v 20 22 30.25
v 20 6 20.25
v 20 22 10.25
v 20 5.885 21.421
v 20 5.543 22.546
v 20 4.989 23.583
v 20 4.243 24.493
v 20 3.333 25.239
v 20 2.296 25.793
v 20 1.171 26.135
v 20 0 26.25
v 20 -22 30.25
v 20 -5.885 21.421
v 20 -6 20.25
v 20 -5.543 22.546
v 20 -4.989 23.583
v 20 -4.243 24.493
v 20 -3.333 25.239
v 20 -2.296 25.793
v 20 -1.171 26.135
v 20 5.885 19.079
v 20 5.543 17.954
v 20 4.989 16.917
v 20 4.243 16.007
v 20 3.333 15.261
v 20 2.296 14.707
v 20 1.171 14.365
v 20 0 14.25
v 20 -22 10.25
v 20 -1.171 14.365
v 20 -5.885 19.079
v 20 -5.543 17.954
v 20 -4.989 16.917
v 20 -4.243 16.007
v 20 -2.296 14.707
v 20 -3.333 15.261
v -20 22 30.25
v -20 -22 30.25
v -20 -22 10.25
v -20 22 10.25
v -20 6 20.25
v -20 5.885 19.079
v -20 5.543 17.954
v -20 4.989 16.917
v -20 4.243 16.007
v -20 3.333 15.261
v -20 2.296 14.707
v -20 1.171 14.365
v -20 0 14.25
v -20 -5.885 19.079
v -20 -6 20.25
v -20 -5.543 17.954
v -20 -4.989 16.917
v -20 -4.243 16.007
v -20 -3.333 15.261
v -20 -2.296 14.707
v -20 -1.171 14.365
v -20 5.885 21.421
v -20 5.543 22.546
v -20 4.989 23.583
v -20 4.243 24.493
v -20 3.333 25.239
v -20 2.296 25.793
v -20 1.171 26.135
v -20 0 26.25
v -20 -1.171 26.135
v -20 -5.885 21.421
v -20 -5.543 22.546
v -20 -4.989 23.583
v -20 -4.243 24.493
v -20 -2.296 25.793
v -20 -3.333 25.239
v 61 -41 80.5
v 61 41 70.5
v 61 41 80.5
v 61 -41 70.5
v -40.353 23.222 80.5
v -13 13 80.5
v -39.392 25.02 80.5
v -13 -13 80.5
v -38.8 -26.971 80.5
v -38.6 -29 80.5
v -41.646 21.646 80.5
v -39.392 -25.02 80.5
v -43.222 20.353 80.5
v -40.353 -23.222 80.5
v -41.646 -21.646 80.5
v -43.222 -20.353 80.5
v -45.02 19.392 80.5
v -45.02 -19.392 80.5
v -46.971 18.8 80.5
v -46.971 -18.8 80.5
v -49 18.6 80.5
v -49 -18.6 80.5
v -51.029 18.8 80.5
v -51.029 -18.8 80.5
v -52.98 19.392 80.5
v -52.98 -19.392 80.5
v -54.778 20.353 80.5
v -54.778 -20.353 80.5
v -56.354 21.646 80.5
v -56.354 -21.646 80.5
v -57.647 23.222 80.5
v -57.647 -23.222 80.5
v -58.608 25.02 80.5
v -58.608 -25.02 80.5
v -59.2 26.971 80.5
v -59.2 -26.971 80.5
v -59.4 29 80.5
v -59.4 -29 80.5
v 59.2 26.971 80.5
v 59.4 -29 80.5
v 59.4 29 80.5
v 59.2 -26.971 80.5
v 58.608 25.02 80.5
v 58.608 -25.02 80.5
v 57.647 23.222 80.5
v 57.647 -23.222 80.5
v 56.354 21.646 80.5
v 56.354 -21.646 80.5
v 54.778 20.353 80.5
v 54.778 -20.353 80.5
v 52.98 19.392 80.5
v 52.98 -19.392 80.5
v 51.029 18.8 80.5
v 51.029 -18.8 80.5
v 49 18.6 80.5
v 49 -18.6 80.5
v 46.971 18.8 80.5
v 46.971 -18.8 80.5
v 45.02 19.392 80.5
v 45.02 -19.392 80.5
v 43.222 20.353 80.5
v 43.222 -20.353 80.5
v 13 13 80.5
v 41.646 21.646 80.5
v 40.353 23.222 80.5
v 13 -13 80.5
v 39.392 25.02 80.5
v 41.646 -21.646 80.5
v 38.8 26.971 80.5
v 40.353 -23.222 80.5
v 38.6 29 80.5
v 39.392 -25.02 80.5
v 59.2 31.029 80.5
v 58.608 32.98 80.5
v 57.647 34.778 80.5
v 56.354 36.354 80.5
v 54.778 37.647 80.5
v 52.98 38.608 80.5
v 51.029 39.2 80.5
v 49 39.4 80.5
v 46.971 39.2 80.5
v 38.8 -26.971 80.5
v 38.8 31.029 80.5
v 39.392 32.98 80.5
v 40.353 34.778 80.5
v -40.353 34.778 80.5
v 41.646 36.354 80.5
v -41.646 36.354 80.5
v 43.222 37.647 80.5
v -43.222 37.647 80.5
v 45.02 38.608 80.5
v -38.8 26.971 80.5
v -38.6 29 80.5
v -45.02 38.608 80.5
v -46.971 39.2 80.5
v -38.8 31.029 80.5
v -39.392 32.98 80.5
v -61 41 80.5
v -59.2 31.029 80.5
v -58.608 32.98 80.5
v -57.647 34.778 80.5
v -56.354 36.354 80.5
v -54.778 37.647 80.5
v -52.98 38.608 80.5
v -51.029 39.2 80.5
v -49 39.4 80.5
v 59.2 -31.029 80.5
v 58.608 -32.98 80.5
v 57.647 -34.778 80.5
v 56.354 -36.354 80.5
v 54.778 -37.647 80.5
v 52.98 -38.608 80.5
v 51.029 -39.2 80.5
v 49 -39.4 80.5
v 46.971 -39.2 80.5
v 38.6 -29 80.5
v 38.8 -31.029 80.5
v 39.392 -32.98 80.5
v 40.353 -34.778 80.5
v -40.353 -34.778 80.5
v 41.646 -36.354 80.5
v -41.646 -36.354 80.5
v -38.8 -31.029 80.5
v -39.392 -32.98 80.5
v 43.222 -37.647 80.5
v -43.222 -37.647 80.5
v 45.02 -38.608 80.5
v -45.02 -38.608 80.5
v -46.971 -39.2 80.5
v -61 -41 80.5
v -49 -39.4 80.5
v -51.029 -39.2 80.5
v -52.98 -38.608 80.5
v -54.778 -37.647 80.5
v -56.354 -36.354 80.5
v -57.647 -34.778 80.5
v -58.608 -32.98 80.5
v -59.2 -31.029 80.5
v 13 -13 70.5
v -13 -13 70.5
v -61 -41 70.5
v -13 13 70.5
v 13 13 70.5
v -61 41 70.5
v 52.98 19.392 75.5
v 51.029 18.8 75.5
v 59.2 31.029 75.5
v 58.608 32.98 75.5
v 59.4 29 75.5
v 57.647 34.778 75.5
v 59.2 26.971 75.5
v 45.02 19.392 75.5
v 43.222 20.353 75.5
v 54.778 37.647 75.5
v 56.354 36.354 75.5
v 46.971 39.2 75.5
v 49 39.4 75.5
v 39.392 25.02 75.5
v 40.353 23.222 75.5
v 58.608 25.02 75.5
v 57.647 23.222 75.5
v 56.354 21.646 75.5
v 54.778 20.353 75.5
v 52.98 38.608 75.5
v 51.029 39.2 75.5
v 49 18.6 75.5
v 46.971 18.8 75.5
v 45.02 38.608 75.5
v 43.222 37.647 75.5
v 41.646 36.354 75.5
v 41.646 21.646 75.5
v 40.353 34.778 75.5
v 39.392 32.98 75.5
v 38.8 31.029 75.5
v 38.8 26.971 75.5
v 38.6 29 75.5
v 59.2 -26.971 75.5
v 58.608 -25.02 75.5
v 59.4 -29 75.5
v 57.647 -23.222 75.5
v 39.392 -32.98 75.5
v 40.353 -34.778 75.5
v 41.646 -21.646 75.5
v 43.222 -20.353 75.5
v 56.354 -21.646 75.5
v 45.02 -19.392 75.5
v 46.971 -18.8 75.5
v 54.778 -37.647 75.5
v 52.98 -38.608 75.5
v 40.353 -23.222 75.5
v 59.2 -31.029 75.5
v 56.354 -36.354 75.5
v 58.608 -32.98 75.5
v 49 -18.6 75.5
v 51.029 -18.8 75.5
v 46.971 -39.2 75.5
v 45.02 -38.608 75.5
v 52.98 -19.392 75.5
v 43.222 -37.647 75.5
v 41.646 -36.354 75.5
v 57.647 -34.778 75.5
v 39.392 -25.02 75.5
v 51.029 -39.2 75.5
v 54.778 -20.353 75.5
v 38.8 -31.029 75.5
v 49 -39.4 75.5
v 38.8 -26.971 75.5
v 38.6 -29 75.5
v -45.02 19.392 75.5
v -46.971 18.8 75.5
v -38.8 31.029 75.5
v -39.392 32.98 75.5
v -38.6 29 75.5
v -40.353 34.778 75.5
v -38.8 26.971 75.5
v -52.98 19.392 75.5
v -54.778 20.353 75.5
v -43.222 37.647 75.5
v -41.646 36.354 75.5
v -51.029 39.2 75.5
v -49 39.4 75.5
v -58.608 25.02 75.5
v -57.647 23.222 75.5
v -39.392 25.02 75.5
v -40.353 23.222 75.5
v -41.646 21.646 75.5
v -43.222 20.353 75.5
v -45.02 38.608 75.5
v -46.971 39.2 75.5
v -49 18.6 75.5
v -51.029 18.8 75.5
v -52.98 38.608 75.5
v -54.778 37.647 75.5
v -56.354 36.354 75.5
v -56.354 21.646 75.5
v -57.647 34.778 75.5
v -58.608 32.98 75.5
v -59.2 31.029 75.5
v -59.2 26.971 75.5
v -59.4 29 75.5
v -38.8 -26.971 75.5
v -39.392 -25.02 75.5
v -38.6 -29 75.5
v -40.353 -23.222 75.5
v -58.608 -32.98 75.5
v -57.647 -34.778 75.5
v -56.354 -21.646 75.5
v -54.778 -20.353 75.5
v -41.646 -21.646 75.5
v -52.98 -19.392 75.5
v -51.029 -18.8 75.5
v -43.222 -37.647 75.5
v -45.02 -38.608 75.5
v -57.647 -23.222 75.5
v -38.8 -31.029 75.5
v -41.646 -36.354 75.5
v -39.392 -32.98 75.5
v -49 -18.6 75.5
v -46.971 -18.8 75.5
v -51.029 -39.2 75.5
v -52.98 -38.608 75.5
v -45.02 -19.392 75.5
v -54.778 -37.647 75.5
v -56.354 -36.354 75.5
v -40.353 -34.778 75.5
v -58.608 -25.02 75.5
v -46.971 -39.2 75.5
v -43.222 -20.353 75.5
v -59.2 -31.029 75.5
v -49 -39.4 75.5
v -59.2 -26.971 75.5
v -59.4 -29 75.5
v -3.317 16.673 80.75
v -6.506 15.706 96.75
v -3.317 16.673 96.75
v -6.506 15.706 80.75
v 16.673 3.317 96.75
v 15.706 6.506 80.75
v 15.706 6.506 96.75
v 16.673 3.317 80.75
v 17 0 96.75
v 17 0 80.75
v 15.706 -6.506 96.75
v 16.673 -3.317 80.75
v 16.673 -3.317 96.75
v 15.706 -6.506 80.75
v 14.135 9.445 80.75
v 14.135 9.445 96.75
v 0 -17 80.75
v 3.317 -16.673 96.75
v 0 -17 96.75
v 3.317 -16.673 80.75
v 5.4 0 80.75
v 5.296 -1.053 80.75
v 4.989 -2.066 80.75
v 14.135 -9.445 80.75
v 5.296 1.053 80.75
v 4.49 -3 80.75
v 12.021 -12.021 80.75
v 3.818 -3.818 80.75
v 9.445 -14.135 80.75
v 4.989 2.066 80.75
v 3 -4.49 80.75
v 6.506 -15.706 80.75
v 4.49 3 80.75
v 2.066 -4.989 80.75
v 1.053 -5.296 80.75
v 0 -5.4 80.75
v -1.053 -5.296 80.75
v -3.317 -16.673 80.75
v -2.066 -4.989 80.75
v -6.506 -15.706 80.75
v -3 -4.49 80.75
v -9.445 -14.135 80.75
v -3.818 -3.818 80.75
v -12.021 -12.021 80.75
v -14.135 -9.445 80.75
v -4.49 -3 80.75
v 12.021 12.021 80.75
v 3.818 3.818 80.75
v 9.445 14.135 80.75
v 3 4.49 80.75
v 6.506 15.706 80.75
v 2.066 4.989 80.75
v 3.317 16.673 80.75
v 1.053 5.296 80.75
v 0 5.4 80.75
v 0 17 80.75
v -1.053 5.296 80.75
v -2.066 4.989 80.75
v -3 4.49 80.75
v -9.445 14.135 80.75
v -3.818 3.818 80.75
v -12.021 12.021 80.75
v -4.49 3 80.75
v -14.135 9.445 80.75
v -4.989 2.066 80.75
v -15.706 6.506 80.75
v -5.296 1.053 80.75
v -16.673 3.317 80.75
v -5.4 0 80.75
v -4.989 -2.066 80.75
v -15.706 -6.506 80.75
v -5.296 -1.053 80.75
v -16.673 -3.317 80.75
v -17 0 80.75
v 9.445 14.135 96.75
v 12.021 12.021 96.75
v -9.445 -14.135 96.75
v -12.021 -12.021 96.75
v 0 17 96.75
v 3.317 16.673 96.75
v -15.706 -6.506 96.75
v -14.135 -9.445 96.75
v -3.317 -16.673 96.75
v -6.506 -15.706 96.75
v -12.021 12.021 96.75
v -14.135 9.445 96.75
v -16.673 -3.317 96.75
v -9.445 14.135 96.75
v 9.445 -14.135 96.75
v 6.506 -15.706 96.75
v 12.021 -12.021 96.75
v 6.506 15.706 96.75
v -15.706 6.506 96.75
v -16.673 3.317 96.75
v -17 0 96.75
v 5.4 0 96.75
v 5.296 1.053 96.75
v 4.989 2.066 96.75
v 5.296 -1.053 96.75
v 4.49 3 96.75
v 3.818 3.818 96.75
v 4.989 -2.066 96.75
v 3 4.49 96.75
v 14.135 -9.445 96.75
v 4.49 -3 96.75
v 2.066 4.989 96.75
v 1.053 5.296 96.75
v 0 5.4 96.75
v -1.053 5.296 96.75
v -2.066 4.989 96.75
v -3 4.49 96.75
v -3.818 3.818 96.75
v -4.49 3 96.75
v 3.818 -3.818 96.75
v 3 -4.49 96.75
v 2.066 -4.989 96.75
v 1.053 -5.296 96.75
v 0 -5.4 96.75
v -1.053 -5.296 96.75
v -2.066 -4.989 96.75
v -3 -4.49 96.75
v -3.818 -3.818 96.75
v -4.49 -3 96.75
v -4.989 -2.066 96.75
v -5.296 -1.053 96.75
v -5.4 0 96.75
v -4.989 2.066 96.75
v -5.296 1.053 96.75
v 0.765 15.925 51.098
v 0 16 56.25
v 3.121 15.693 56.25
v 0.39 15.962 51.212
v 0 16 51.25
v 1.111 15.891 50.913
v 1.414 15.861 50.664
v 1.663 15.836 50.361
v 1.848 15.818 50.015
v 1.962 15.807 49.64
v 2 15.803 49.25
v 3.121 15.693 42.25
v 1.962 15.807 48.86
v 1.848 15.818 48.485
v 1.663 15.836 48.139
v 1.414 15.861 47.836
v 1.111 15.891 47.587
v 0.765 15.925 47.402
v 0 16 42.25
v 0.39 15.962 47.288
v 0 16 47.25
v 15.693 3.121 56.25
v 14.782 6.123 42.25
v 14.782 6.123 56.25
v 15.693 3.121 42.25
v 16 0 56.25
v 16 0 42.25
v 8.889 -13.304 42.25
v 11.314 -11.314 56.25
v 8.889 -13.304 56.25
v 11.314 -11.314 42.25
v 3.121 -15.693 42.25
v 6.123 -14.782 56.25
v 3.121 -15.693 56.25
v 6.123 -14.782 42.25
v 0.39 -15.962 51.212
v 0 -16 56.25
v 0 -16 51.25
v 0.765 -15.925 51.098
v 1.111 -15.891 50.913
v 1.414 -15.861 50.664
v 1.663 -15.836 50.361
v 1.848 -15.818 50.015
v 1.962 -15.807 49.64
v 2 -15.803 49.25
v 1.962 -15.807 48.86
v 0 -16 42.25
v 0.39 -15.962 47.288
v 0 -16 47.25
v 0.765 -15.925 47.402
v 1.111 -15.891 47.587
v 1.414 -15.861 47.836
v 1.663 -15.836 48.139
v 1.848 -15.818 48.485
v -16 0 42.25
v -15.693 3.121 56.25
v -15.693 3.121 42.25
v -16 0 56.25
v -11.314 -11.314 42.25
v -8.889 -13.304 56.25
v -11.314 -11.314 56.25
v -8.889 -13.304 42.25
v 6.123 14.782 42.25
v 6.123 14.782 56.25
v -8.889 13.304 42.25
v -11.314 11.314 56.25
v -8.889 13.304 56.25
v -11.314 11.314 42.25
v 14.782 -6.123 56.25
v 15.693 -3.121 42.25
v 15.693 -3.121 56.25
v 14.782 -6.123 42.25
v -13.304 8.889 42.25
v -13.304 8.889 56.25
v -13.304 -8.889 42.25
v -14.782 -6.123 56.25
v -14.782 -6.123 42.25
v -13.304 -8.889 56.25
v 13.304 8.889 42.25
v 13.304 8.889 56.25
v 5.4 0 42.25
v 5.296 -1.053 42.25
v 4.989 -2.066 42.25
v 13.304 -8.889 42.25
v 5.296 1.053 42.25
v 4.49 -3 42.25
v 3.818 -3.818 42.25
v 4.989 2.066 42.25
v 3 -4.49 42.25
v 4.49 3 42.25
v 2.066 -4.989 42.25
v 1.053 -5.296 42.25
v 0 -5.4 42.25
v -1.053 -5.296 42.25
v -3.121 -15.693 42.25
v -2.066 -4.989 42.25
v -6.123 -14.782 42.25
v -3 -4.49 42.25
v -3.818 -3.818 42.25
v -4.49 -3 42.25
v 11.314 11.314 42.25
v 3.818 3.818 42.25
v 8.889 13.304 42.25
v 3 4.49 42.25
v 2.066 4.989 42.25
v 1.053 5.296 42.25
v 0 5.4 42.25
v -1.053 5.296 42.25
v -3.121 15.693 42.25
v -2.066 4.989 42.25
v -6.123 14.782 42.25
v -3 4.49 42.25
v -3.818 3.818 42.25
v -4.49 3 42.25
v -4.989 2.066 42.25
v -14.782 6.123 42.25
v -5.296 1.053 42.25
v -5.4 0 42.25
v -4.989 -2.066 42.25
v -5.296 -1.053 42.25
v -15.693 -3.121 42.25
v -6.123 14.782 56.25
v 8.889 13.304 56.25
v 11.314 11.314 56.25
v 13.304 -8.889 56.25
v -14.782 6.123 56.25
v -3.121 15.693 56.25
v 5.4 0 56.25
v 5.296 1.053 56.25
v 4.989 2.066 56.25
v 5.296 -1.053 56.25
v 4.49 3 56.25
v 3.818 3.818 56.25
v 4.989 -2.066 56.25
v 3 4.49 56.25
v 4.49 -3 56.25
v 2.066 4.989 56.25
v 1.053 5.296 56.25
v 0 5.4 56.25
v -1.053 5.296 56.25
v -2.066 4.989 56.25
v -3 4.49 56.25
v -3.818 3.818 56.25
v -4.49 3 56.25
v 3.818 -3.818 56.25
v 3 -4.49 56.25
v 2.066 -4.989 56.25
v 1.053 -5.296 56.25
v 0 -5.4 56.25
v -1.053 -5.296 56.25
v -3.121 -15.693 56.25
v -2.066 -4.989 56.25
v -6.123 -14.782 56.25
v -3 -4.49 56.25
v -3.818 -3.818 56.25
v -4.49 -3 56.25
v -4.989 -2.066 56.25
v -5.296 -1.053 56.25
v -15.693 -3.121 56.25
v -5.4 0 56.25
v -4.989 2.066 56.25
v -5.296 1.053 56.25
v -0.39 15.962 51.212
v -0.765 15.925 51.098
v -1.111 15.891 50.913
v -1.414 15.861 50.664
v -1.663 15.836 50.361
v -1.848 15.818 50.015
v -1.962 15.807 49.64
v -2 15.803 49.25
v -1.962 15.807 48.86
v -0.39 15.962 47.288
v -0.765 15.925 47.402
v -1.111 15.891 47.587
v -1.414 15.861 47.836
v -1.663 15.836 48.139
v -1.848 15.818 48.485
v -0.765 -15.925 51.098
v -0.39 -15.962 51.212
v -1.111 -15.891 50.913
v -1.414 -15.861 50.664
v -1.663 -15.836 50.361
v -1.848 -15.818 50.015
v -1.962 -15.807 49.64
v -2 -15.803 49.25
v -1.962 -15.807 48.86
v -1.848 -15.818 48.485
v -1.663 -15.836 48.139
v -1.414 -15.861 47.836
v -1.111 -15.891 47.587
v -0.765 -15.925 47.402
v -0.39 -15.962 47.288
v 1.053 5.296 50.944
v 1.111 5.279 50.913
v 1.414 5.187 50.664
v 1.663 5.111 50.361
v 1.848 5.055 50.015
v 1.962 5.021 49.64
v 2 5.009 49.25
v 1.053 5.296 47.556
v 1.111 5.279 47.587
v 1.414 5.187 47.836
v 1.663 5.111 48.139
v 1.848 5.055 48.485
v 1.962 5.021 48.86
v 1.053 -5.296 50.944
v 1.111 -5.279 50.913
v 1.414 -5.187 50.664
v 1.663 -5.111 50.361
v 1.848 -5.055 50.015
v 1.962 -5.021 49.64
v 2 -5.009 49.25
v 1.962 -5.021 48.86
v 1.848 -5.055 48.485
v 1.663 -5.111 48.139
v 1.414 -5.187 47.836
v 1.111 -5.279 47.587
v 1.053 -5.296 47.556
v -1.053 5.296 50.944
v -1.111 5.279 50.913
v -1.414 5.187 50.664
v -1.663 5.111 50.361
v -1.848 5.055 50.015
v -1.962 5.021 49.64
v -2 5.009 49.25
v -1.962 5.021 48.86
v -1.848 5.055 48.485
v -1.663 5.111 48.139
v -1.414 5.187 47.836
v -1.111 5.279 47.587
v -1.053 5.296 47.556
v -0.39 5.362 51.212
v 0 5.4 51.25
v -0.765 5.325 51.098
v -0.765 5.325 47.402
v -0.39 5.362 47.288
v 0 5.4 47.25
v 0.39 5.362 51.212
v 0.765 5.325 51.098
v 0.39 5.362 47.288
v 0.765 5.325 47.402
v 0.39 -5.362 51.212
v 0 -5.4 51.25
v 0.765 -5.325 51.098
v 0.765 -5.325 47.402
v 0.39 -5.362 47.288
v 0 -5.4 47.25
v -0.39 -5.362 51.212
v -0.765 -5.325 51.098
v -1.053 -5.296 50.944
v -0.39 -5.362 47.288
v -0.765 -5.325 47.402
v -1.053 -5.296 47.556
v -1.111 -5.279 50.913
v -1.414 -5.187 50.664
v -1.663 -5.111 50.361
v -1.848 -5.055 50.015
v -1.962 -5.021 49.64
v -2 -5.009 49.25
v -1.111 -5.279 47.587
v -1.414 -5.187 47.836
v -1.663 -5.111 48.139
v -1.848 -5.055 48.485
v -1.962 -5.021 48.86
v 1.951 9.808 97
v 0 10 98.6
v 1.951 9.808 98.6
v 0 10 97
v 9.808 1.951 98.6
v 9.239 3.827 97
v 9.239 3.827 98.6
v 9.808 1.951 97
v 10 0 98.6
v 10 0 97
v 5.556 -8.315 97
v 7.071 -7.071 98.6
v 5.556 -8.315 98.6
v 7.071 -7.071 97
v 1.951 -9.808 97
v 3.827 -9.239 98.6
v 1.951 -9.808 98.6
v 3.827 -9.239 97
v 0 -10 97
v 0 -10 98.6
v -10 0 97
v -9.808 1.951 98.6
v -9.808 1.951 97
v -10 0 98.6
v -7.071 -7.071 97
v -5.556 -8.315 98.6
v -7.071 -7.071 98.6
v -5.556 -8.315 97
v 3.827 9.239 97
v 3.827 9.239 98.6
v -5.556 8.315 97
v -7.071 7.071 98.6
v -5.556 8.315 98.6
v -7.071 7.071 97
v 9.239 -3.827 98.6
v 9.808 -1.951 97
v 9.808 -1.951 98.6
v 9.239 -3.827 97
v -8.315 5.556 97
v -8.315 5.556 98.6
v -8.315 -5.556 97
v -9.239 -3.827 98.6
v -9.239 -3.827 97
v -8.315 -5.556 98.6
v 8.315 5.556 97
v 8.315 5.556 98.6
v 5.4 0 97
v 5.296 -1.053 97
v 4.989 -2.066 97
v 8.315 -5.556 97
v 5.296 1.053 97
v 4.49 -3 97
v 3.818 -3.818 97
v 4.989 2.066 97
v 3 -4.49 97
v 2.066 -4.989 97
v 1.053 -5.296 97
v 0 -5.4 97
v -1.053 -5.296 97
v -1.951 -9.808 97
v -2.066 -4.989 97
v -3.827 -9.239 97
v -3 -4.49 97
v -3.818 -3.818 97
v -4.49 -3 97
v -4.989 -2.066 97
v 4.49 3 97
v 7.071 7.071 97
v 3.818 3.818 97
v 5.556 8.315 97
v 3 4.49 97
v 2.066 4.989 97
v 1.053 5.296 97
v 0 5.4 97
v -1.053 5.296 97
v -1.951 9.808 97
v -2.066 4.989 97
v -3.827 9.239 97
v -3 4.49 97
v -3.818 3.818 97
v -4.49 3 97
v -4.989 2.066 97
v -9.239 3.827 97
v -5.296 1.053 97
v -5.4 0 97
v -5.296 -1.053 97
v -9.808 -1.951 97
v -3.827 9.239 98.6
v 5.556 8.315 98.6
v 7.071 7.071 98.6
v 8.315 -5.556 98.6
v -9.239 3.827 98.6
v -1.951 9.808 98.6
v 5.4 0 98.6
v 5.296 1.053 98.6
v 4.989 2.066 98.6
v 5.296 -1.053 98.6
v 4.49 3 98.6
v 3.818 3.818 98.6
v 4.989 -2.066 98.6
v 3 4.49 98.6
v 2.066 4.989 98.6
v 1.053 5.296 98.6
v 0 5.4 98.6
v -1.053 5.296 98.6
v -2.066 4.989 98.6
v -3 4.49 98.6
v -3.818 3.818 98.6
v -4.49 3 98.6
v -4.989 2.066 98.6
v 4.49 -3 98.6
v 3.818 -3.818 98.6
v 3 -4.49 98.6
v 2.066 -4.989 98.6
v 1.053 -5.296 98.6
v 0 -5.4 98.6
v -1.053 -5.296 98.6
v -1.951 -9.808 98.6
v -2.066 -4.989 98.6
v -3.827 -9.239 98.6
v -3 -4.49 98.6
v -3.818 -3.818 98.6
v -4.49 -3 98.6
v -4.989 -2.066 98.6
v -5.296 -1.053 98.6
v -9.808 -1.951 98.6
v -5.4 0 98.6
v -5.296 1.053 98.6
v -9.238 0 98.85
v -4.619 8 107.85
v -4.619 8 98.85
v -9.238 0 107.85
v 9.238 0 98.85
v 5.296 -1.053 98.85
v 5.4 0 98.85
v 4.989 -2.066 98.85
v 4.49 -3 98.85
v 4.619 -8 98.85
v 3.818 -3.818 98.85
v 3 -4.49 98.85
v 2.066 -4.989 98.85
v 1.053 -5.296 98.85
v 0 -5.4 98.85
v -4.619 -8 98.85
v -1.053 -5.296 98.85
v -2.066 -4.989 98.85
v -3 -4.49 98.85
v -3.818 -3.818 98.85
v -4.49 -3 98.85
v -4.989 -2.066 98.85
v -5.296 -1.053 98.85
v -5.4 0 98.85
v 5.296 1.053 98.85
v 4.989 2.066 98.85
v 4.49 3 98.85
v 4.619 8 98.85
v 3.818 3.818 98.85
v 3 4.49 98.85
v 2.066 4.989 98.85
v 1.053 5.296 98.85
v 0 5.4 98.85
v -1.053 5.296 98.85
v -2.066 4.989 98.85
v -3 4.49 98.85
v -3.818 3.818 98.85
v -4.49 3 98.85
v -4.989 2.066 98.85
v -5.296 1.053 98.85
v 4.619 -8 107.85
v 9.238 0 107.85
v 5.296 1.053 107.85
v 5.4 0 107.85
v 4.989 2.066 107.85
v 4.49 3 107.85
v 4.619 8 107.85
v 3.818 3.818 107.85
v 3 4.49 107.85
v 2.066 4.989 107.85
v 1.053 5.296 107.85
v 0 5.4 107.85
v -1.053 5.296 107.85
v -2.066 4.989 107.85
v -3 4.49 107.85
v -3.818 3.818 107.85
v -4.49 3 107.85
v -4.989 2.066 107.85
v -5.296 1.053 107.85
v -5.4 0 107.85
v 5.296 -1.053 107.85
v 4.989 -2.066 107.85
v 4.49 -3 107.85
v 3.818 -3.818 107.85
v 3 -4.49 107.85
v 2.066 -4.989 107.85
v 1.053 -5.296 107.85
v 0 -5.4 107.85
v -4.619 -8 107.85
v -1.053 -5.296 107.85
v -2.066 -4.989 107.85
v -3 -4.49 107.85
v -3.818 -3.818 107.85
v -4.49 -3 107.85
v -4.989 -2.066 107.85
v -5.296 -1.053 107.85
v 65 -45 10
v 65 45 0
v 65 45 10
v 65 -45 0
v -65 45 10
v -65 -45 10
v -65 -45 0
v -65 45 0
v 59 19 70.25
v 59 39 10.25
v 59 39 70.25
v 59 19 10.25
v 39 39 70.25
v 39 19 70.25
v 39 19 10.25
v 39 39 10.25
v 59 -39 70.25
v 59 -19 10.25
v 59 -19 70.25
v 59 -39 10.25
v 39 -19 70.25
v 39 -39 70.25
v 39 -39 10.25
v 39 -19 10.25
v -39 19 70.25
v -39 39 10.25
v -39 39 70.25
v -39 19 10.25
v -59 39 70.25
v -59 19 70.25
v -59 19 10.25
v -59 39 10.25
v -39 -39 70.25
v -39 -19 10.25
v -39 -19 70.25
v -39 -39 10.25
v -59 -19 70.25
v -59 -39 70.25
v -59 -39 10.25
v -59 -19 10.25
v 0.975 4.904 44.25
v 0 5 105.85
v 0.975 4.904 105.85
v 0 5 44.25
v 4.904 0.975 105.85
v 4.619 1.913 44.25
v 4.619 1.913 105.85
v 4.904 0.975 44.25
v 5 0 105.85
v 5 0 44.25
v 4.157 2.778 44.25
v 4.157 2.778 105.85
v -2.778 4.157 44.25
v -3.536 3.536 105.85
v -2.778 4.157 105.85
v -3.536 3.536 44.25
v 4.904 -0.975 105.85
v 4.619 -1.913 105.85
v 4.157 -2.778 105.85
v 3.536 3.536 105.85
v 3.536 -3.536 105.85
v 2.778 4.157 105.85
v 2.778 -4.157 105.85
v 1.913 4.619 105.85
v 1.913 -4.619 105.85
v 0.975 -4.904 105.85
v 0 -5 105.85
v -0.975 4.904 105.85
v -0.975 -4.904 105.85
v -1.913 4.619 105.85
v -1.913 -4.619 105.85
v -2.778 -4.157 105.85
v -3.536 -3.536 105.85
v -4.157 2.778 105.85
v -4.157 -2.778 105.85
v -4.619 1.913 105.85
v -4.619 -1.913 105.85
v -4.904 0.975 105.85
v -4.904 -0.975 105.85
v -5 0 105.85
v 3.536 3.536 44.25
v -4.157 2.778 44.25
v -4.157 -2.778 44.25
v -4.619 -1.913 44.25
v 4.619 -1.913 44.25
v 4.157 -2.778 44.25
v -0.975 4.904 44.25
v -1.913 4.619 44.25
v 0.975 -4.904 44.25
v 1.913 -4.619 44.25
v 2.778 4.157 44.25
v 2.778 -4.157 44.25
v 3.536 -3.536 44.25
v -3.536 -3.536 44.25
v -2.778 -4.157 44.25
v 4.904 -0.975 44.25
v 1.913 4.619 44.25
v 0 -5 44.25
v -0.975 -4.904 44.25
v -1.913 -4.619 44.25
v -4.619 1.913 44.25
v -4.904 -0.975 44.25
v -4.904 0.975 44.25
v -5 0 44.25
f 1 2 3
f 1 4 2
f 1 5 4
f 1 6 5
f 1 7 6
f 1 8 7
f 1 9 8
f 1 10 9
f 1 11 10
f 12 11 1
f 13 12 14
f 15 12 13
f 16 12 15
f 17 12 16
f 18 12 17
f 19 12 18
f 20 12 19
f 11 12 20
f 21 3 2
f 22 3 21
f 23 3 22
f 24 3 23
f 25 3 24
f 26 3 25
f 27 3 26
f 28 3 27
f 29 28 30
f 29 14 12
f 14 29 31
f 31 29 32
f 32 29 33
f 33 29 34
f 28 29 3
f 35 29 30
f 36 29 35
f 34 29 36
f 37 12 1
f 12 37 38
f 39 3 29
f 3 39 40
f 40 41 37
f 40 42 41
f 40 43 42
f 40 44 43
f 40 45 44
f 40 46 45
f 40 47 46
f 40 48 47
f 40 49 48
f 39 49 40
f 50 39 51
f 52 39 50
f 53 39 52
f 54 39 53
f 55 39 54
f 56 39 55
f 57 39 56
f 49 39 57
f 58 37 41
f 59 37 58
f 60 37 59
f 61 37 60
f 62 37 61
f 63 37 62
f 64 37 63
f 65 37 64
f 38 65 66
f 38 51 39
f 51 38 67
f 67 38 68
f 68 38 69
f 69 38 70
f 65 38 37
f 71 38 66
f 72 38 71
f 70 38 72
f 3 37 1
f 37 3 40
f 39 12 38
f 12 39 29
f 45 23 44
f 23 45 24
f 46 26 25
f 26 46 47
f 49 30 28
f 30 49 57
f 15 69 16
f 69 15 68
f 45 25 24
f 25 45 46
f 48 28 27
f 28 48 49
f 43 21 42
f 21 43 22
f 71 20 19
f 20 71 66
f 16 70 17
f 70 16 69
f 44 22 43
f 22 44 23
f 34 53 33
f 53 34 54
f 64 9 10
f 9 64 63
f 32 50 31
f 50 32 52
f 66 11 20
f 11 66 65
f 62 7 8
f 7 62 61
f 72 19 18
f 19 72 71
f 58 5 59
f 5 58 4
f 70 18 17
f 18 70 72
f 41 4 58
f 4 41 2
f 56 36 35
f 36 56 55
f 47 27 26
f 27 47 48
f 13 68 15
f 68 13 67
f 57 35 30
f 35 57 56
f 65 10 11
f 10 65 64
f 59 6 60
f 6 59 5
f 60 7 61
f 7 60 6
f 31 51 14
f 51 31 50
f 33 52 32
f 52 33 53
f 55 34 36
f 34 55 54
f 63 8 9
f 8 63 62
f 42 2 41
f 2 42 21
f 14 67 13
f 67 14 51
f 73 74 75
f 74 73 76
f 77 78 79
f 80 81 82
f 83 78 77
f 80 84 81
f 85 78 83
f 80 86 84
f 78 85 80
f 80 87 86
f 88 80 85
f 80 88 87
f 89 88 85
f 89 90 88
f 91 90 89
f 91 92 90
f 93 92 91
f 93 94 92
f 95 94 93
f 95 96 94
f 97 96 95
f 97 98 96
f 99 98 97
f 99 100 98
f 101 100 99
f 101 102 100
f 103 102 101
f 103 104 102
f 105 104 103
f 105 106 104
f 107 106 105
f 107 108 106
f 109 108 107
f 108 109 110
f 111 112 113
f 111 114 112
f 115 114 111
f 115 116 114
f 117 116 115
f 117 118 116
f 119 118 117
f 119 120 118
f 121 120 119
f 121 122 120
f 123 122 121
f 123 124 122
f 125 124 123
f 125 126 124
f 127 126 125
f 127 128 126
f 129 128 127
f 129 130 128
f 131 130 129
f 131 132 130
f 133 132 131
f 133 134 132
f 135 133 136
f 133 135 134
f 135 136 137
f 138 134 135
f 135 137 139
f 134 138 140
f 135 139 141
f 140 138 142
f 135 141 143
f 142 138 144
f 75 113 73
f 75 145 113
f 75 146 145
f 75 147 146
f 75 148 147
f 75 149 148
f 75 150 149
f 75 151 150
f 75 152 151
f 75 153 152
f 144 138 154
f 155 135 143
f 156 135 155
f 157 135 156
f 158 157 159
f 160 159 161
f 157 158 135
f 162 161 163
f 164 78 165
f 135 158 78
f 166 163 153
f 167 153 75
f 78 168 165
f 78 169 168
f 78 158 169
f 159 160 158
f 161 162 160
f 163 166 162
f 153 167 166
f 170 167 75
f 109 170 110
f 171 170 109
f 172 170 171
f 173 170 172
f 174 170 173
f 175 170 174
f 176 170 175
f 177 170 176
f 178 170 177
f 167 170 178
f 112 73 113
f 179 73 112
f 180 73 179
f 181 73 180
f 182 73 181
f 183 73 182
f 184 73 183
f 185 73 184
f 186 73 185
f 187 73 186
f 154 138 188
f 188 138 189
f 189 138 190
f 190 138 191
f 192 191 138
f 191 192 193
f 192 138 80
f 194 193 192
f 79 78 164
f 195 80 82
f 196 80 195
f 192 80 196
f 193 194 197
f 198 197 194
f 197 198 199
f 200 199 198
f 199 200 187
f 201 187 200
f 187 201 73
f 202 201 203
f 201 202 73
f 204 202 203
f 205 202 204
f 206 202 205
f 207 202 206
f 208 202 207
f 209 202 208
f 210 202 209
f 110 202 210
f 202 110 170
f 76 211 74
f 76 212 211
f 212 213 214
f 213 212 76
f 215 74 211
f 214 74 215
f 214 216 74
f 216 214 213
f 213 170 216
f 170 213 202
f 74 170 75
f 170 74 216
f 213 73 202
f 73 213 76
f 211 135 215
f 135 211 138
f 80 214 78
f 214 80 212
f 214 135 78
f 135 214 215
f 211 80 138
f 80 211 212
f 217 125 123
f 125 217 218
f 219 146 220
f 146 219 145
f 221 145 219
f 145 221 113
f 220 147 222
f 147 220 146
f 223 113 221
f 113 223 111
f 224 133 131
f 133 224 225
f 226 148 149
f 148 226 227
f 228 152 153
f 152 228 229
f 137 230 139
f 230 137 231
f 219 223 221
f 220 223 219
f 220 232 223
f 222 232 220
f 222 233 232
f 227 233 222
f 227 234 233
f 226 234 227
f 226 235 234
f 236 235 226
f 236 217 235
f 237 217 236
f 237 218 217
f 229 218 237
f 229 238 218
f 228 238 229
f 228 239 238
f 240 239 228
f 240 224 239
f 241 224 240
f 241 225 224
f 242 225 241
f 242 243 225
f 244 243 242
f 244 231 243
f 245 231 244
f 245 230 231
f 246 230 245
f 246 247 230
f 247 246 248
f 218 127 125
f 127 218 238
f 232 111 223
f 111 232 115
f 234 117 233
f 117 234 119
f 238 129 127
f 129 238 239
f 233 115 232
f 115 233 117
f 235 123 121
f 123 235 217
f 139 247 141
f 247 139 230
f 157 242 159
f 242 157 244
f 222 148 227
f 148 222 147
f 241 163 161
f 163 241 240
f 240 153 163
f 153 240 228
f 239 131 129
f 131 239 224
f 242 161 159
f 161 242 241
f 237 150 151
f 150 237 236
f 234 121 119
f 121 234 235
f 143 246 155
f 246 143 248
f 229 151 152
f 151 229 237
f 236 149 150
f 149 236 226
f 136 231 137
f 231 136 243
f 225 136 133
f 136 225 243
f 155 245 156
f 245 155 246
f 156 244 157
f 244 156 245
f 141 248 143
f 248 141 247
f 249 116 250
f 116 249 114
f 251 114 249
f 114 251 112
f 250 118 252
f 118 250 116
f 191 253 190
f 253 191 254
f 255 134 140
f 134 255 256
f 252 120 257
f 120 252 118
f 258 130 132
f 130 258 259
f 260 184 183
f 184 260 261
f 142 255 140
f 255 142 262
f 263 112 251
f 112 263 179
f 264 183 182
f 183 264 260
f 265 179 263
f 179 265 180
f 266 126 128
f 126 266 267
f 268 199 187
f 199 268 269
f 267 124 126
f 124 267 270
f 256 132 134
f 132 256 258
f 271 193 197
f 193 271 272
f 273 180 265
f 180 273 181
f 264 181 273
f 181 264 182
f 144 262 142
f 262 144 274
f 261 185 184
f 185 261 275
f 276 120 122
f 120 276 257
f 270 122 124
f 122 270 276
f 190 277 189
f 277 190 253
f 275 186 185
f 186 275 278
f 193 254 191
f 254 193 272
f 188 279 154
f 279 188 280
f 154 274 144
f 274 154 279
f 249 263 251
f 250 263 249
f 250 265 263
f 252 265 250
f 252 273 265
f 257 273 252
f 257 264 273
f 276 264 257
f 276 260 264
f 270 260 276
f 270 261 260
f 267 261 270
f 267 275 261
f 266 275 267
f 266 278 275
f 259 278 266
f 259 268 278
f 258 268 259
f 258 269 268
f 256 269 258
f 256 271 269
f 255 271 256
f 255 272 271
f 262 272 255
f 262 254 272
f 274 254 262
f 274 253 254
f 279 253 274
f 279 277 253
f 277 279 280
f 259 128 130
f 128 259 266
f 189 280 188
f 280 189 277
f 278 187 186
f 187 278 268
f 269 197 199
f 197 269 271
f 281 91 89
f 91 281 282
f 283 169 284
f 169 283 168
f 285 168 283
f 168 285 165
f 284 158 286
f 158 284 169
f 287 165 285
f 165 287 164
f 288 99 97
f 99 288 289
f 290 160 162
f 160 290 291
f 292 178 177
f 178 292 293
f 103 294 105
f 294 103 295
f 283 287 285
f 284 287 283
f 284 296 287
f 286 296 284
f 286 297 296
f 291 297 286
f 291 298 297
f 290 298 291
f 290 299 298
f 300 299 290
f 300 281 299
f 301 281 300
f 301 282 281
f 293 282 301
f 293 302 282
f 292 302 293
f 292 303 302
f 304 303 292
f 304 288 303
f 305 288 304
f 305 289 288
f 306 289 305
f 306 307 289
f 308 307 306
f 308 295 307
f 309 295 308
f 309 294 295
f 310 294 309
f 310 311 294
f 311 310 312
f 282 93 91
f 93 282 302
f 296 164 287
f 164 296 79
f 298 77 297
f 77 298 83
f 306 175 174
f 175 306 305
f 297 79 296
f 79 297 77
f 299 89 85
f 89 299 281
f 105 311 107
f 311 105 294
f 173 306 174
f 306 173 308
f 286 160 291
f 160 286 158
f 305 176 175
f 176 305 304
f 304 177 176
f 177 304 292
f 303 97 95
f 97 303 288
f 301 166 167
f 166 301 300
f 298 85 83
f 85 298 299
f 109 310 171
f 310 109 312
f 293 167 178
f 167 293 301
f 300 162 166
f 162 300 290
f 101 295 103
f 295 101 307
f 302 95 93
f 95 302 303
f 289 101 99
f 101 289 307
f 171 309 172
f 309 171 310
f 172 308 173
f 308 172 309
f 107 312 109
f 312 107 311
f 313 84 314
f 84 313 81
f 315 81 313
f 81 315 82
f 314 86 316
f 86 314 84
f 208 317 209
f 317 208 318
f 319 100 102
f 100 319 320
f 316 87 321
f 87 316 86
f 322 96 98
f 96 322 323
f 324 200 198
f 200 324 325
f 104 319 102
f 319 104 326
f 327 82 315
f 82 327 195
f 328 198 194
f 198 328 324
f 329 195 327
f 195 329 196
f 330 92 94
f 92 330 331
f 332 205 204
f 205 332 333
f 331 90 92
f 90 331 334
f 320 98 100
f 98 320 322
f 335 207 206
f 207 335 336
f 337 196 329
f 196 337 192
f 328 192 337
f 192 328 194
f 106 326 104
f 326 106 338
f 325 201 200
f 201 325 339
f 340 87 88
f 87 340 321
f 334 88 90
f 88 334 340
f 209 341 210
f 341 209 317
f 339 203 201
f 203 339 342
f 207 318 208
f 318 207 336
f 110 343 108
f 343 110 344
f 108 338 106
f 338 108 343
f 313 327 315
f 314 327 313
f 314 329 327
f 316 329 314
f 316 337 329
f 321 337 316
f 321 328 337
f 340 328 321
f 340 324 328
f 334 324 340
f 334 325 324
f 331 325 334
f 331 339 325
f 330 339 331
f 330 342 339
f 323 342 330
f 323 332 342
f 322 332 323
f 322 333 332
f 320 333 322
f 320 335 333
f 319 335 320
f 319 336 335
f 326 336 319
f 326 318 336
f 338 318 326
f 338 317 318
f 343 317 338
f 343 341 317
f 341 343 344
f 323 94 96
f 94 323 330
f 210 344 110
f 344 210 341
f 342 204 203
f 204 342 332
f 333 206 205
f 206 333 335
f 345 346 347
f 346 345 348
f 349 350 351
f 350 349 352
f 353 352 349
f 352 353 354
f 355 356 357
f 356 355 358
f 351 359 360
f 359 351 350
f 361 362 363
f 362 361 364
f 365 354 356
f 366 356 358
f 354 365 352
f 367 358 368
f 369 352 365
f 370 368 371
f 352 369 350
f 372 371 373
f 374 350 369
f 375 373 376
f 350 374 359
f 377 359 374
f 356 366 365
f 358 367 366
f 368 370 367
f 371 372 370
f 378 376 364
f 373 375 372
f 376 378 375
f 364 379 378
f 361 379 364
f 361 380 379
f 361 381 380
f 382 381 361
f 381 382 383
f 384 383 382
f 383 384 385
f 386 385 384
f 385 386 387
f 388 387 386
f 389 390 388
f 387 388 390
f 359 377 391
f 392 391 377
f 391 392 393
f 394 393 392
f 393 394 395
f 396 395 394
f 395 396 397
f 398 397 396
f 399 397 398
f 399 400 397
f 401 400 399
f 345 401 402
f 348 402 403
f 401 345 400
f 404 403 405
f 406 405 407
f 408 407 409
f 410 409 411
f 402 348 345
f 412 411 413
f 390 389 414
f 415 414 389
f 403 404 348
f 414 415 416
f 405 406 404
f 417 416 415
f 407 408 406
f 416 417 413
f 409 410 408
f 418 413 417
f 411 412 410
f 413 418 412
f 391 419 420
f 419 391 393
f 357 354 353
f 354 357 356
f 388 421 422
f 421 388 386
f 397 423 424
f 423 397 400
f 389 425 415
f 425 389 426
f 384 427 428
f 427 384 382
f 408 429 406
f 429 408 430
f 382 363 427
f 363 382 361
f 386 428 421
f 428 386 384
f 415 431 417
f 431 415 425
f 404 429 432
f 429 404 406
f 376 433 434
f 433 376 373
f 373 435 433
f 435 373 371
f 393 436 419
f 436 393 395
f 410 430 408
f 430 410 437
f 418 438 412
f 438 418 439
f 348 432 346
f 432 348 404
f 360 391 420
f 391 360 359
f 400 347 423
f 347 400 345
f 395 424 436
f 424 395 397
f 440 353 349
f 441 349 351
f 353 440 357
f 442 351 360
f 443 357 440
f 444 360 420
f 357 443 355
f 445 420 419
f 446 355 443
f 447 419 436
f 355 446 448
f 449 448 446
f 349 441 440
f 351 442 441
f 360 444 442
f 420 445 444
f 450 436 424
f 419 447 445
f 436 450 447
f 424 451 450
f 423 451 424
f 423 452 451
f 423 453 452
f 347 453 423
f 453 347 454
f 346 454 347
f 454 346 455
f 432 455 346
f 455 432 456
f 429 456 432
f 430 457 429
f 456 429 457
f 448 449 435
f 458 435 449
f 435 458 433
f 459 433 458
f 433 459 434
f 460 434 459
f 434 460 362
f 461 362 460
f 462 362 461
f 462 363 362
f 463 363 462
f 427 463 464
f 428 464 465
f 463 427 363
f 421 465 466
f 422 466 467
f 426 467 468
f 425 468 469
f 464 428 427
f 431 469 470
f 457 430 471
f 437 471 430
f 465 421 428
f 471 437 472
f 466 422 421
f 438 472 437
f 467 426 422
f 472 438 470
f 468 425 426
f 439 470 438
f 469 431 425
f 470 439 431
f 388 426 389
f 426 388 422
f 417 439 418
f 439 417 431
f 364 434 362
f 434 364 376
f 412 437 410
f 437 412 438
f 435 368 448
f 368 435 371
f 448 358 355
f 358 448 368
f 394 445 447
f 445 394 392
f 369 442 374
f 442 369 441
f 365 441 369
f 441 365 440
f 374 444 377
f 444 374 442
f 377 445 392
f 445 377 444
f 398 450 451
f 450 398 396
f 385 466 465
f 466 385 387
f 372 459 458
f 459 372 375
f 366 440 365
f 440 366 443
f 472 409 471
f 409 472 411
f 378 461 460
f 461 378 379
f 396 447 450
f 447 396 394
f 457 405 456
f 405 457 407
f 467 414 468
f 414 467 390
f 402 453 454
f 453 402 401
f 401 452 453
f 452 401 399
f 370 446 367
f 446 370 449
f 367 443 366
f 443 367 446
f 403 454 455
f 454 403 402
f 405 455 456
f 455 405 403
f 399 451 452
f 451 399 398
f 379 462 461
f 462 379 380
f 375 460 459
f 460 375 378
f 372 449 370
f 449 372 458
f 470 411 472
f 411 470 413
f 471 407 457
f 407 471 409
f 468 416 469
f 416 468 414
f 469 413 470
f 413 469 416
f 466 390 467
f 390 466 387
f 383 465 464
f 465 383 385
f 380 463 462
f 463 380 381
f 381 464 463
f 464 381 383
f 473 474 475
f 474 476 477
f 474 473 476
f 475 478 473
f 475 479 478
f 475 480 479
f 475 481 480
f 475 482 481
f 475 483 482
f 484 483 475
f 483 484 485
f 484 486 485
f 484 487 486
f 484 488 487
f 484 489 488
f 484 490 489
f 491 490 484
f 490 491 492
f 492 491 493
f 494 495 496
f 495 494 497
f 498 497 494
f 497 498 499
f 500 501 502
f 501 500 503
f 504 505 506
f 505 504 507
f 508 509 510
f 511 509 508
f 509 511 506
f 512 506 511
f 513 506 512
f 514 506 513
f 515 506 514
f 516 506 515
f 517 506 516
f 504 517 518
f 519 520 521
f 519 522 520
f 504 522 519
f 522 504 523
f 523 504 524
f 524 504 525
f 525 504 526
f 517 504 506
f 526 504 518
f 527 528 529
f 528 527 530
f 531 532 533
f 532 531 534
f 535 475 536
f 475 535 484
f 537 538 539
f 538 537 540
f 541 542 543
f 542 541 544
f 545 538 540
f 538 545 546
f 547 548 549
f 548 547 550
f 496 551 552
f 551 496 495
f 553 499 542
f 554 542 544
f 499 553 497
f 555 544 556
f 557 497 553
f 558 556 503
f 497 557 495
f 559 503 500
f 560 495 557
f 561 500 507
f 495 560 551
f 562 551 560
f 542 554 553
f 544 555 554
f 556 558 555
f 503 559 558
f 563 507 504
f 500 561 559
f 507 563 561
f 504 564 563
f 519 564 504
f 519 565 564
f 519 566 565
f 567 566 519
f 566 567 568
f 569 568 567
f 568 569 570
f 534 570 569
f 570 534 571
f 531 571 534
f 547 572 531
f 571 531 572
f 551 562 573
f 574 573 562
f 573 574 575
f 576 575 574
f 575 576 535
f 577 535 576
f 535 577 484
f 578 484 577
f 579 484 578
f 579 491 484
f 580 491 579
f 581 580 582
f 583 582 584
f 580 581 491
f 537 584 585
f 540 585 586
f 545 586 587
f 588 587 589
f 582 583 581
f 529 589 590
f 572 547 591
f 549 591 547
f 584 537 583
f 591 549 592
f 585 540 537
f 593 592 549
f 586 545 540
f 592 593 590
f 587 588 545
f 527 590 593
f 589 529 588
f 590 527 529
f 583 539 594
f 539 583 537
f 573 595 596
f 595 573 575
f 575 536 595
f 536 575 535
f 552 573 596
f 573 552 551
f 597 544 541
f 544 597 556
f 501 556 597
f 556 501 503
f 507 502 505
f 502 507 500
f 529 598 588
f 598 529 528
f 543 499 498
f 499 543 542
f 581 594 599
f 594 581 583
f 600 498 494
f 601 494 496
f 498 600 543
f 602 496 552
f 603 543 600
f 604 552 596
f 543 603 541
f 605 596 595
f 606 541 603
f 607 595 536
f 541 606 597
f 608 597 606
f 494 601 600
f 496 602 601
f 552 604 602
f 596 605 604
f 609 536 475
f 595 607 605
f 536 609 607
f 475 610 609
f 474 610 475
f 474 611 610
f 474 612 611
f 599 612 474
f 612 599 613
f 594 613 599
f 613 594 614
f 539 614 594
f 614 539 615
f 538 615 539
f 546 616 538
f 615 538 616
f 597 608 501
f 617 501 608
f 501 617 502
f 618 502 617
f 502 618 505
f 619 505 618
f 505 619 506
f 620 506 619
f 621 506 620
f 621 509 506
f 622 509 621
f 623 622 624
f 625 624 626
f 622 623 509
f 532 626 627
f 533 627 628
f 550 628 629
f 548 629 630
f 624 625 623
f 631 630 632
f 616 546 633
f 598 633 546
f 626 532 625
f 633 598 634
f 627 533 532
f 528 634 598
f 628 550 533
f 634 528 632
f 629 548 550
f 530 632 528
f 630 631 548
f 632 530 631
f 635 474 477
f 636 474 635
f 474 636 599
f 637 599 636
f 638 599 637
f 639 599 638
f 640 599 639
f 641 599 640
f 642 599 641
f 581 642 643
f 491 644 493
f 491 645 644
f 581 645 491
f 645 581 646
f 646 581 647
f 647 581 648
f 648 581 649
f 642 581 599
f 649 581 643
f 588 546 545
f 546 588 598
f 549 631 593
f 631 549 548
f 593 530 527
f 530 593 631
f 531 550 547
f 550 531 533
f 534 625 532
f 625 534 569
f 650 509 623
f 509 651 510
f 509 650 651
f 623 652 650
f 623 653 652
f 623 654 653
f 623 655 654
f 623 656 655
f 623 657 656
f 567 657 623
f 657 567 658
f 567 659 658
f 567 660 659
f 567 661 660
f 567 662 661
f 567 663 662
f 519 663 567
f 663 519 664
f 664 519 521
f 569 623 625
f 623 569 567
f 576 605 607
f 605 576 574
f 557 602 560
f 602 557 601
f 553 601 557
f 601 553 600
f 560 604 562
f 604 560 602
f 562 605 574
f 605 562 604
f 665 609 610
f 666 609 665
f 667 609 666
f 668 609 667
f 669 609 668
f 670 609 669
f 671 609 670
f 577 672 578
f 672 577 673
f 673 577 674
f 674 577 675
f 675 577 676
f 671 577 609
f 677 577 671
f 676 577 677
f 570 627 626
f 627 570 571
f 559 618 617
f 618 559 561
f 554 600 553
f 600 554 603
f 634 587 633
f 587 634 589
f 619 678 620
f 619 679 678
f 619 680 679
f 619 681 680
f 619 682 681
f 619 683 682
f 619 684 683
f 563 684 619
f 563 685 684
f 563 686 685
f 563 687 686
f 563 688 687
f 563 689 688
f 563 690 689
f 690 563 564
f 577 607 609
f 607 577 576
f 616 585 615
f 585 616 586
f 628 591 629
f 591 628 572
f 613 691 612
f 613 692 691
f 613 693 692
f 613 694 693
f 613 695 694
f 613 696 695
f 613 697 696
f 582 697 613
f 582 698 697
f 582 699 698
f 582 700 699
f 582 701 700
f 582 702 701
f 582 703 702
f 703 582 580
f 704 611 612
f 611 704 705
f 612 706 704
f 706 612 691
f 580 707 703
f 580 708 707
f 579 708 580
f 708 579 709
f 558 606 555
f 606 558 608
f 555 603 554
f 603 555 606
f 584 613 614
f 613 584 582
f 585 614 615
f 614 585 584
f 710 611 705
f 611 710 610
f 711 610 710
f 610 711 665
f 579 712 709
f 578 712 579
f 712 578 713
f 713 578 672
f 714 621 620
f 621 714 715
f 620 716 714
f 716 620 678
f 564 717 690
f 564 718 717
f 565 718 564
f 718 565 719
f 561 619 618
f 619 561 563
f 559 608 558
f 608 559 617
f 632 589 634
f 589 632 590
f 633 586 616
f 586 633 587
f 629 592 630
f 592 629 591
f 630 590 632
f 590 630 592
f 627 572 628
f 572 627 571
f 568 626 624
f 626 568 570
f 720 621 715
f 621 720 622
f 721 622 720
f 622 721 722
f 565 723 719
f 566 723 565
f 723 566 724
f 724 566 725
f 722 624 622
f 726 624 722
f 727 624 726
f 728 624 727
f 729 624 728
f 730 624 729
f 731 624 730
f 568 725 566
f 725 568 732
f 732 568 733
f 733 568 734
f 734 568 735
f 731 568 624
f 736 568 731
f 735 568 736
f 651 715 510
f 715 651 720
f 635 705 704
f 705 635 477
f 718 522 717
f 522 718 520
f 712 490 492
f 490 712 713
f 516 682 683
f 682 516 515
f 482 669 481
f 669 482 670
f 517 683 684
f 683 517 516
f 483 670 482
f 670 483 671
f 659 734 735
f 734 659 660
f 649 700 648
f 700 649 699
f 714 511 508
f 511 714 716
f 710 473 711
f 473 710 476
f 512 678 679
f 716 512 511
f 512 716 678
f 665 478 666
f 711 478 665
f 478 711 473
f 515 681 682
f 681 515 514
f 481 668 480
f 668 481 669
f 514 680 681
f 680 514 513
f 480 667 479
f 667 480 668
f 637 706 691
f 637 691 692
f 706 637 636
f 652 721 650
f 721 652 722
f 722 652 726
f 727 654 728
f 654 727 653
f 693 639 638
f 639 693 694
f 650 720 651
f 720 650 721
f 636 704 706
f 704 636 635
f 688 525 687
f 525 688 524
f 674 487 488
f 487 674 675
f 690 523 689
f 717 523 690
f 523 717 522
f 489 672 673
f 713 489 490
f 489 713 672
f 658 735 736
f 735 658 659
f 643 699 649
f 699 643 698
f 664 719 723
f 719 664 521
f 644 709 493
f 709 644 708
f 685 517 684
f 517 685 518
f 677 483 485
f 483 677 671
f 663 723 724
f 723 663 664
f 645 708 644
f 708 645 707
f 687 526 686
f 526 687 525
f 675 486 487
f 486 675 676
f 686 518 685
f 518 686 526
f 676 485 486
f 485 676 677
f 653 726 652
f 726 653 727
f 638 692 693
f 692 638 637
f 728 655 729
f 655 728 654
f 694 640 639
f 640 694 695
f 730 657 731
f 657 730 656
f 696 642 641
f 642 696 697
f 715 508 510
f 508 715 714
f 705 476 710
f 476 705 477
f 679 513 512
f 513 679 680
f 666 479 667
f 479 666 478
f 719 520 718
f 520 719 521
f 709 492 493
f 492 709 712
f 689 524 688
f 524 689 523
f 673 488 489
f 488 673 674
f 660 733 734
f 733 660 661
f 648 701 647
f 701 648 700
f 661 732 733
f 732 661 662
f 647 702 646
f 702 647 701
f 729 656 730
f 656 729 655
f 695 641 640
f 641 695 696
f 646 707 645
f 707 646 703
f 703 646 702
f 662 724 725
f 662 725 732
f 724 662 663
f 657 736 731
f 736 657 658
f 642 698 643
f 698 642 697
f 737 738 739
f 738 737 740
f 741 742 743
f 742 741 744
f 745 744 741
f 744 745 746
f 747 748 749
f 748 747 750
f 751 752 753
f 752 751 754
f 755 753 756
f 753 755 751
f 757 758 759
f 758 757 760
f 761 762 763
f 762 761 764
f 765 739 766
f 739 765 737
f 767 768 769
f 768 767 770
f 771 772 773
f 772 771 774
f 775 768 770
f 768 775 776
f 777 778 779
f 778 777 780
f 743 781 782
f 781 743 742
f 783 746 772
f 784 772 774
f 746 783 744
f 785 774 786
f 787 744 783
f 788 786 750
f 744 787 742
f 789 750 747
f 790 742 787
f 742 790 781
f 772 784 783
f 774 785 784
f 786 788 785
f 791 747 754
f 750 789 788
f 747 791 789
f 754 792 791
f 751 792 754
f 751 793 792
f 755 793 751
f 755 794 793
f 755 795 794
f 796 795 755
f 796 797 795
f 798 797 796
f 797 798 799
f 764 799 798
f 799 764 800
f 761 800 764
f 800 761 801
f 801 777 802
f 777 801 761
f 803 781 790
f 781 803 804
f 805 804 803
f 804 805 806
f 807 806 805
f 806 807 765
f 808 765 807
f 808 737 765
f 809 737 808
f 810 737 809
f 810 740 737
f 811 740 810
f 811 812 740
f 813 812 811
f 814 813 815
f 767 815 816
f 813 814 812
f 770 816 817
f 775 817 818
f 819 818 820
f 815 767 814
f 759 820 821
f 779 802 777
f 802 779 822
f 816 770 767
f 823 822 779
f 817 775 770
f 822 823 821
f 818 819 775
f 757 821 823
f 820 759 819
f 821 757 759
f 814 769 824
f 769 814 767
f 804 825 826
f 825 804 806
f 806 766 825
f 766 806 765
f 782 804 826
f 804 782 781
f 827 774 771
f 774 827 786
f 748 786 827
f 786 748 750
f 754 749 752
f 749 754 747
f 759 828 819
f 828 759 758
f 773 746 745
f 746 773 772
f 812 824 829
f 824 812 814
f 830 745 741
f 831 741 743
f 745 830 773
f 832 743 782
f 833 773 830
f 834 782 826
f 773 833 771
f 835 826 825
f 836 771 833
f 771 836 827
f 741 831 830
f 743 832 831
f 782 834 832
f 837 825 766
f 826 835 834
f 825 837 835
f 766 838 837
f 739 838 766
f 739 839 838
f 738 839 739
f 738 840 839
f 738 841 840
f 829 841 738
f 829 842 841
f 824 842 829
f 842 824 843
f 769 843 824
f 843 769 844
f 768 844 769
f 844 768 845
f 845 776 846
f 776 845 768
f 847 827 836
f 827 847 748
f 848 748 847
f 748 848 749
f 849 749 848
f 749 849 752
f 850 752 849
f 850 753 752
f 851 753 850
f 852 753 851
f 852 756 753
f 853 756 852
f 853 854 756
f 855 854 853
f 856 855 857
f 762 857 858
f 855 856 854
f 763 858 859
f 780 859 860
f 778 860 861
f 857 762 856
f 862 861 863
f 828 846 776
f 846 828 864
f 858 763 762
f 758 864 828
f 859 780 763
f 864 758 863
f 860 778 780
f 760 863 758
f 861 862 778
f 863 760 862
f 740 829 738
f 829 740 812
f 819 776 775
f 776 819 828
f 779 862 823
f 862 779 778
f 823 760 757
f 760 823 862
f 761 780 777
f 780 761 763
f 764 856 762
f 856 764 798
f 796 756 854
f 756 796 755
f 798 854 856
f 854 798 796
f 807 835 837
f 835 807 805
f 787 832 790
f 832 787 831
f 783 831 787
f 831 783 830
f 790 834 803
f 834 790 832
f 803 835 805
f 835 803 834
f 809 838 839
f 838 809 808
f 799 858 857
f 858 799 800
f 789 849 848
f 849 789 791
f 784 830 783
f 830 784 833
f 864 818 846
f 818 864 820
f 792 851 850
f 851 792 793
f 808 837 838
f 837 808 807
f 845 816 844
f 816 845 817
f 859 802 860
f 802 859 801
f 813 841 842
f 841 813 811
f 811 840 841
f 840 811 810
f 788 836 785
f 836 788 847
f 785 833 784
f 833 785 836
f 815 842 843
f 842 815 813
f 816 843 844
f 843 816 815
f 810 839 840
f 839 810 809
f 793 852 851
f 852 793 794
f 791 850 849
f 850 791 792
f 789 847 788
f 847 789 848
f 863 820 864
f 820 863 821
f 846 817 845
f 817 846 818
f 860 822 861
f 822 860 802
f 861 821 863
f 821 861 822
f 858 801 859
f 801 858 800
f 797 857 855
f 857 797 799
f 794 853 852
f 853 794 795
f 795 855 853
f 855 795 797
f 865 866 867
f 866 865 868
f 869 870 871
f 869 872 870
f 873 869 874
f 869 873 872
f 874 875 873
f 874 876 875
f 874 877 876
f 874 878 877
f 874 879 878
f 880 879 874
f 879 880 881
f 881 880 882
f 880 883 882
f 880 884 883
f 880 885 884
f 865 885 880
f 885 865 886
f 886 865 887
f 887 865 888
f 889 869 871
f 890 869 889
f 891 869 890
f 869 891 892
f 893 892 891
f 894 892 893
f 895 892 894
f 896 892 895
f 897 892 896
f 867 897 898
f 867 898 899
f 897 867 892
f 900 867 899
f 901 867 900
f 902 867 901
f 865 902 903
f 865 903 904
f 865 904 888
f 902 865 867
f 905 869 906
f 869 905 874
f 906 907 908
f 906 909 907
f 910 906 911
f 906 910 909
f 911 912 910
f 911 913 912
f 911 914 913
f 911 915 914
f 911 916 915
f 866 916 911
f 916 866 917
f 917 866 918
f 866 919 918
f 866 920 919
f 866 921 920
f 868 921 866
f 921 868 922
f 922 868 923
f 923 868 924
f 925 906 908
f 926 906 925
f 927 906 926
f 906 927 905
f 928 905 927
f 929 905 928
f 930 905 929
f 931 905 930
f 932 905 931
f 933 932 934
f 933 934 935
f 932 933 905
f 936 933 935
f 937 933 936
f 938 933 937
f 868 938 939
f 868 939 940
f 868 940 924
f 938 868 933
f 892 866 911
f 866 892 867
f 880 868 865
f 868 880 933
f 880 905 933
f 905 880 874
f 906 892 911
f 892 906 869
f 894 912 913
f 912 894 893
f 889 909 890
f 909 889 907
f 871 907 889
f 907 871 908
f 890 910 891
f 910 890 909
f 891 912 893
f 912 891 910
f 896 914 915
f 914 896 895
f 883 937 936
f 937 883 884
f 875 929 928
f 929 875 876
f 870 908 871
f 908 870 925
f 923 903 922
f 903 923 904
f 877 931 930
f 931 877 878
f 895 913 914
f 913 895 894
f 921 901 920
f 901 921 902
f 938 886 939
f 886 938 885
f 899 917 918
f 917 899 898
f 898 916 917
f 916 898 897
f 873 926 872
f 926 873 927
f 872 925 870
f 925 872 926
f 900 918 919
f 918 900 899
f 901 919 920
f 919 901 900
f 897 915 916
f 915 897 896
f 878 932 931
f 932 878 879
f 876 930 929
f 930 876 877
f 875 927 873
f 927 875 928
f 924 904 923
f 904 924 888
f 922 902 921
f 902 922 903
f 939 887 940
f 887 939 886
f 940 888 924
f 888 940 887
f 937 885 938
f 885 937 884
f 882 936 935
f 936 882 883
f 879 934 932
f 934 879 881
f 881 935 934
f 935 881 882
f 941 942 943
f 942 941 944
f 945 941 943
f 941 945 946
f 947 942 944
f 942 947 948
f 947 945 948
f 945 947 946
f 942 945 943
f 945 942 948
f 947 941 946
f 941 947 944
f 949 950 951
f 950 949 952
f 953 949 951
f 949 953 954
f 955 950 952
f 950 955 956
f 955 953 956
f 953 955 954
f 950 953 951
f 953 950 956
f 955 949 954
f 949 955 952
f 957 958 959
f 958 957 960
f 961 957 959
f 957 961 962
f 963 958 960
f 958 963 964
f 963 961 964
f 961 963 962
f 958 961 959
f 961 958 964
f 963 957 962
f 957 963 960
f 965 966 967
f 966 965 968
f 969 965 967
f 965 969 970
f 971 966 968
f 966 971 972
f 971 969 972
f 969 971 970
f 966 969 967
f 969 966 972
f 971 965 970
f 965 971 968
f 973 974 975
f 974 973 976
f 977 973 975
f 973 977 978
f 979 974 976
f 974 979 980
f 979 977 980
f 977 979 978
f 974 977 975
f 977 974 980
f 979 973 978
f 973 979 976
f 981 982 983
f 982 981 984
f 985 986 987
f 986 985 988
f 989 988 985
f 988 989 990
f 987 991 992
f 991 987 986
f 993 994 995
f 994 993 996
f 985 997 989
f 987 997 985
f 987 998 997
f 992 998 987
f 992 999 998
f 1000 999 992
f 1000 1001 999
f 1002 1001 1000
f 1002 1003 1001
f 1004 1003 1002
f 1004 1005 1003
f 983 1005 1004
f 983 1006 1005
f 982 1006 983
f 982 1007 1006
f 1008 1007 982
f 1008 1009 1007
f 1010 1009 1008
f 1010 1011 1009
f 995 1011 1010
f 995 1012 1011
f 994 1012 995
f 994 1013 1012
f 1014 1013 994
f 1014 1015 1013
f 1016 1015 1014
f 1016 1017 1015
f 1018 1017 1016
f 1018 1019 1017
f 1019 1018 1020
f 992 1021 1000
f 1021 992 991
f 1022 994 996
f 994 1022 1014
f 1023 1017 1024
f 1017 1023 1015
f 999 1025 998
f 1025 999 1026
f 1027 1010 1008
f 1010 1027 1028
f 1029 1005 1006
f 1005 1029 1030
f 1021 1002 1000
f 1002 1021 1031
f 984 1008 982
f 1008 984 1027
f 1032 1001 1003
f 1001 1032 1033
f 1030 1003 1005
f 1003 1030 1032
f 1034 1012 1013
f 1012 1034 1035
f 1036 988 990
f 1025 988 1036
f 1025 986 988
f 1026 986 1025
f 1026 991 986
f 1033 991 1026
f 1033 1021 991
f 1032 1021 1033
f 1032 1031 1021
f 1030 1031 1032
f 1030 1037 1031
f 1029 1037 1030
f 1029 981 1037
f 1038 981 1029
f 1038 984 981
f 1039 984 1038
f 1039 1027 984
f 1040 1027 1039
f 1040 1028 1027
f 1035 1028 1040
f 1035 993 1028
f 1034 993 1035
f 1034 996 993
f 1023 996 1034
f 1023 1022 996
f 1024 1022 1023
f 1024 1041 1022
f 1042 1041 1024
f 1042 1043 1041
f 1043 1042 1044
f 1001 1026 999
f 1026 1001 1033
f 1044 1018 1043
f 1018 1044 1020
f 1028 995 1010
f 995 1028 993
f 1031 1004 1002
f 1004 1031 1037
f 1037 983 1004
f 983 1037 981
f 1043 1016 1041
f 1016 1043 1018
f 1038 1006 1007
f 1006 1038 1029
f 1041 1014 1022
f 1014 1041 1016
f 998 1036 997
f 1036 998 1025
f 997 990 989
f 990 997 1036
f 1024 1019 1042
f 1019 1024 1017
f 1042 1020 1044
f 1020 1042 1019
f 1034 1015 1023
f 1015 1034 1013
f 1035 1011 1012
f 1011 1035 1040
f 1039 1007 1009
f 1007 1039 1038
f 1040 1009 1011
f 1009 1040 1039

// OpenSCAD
$fn = 32;

// ------------------------------------------------------------------------
// Arbor press fixture: screw d10, posts 60 mm, gap 12 mm
// Every part is its own module, assembly() places every instance.
// ------------------------------------------------------------------------

// --- part 1 ---
module press_bed() {
  difference() {
    translate([-65, -45, 0]) cube([130, 90, 10]);
  }
}

// --- part 2 ---
module anvil_block() {
  difference() {
    translate([-20, -22, 0]) cube([40, 44, 20]);
    translate([0, 0, 10]) rotate([0, 90, 0]) cylinder(h = 42, d = 12, center = true);
  }
}

// --- part 3 ---
module press_post_a() {
  translate([-10, -10, 0]) cube([20, 20, 60]);
}

// --- part 4 ---
module press_post_b() {
  translate([-10, -10, 0]) cube([20, 20, 60]);
}

// --- part 5 ---
module press_post_c() {
  translate([-10, -10, 0]) cube([20, 20, 60]);
}

// --- part 6 ---
module press_post_d() {
  translate([-10, -10, 0]) cube([20, 20, 60]);
}

// --- part 7 ---
module press_frame() {
  difference() {
    translate([-61, -41, 0]) cube([122, 82, 10]);
    translate([-13, -13, -1]) cube([26, 26, 12]);
    translate([49, 29, 5]) cylinder(h = 6, d = 20.8);
    translate([49, -29, 5]) cylinder(h = 6, d = 20.8);
    translate([-49, 29, 5]) cylinder(h = 6, d = 20.8);
    translate([-49, -29, 5]) cylinder(h = 6, d = 20.8);
  }
}

// --- part 8 ---
module guide_ring() {
  difference() {
      translate([0, 0, 0]) cylinder(h = 16, d = 34);
      translate([0, 0, -1]) cylinder(h = 18, d = 10.8);
    }
}

// --- part 9 ---
module press_screw() {
  translate([0, 0, -30.8]) cylinder(h = 61.6, d = 10);
}

// --- part 10 ---
module press_head() {
  difference() {
    cylinder(h = 14, d = 32);
    translate([0, 0, -1]) cylinder(h = 16, d = 10.8);
    translate([0, 0, 7]) rotate([90, 0, 0]) cylinder(h = 34, d = 4, center = true);
  }
}

// --- part 11 ---
module nut_washer() {
  difference() {
      translate([0, 0, 0]) cylinder(h = 1.6, d = 20);
      translate([0, 0, -1]) cylinder(h = 3.6, d = 10.8);
    }
}

// --- part 12 ---
module press_nut() {
  difference() {
    linear_extrude(height = 9) polygon(points = [[9.238, 0], [4.619, 8], [-4.619, 8], [-9.238, 0], [-4.619, -8], [4.619, -8]]);
    translate([0, 0, -1]) cylinder(h = 11, d = 10.8);
  }
}

// --- assembly ---
module assembly() {
  color([0.80, 0.24, 0.20]) translate([0, 0, 0]) rotate([0, 0, 0]) press_bed();
  color([0.20, 0.45, 0.75]) translate([0, 0, 10.25]) rotate([0, 0, 0]) anvil_block();
  color([0.25, 0.62, 0.32]) translate([49, 29, 10.25]) rotate([0, 0, 0]) press_post_a();
  color([0.92, 0.70, 0.18]) translate([49, -29, 10.25]) rotate([0, 0, 0]) press_post_b();
  color([0.58, 0.35, 0.70]) translate([-49, 29, 10.25]) rotate([0, 0, 0]) press_post_c();
  color([0.16, 0.66, 0.66]) translate([-49, -29, 10.25]) rotate([0, 0, 0]) press_post_d();
  color([0.85, 0.48, 0.18]) translate([0, 0, 70.5]) rotate([0, 0, 0]) press_frame();
  color([0.55, 0.60, 0.65]) translate([0, 0, 80.75]) rotate([0, 0, 0]) guide_ring();
  color([0.75, 0.30, 0.55]) translate([0, 0, 75.05]) rotate([0, 0, 0]) press_screw();
  color([0.42, 0.52, 0.28]) translate([0, 0, 42.25]) rotate([0, 0, 0]) press_head();
  color([0.80, 0.24, 0.20]) translate([0, 0, 97]) rotate([0, 0, 0]) nut_washer();
  color([0.20, 0.45, 0.75]) translate([0, 0, 98.85]) rotate([0, 0, 0]) press_nut();
}

assembly();
